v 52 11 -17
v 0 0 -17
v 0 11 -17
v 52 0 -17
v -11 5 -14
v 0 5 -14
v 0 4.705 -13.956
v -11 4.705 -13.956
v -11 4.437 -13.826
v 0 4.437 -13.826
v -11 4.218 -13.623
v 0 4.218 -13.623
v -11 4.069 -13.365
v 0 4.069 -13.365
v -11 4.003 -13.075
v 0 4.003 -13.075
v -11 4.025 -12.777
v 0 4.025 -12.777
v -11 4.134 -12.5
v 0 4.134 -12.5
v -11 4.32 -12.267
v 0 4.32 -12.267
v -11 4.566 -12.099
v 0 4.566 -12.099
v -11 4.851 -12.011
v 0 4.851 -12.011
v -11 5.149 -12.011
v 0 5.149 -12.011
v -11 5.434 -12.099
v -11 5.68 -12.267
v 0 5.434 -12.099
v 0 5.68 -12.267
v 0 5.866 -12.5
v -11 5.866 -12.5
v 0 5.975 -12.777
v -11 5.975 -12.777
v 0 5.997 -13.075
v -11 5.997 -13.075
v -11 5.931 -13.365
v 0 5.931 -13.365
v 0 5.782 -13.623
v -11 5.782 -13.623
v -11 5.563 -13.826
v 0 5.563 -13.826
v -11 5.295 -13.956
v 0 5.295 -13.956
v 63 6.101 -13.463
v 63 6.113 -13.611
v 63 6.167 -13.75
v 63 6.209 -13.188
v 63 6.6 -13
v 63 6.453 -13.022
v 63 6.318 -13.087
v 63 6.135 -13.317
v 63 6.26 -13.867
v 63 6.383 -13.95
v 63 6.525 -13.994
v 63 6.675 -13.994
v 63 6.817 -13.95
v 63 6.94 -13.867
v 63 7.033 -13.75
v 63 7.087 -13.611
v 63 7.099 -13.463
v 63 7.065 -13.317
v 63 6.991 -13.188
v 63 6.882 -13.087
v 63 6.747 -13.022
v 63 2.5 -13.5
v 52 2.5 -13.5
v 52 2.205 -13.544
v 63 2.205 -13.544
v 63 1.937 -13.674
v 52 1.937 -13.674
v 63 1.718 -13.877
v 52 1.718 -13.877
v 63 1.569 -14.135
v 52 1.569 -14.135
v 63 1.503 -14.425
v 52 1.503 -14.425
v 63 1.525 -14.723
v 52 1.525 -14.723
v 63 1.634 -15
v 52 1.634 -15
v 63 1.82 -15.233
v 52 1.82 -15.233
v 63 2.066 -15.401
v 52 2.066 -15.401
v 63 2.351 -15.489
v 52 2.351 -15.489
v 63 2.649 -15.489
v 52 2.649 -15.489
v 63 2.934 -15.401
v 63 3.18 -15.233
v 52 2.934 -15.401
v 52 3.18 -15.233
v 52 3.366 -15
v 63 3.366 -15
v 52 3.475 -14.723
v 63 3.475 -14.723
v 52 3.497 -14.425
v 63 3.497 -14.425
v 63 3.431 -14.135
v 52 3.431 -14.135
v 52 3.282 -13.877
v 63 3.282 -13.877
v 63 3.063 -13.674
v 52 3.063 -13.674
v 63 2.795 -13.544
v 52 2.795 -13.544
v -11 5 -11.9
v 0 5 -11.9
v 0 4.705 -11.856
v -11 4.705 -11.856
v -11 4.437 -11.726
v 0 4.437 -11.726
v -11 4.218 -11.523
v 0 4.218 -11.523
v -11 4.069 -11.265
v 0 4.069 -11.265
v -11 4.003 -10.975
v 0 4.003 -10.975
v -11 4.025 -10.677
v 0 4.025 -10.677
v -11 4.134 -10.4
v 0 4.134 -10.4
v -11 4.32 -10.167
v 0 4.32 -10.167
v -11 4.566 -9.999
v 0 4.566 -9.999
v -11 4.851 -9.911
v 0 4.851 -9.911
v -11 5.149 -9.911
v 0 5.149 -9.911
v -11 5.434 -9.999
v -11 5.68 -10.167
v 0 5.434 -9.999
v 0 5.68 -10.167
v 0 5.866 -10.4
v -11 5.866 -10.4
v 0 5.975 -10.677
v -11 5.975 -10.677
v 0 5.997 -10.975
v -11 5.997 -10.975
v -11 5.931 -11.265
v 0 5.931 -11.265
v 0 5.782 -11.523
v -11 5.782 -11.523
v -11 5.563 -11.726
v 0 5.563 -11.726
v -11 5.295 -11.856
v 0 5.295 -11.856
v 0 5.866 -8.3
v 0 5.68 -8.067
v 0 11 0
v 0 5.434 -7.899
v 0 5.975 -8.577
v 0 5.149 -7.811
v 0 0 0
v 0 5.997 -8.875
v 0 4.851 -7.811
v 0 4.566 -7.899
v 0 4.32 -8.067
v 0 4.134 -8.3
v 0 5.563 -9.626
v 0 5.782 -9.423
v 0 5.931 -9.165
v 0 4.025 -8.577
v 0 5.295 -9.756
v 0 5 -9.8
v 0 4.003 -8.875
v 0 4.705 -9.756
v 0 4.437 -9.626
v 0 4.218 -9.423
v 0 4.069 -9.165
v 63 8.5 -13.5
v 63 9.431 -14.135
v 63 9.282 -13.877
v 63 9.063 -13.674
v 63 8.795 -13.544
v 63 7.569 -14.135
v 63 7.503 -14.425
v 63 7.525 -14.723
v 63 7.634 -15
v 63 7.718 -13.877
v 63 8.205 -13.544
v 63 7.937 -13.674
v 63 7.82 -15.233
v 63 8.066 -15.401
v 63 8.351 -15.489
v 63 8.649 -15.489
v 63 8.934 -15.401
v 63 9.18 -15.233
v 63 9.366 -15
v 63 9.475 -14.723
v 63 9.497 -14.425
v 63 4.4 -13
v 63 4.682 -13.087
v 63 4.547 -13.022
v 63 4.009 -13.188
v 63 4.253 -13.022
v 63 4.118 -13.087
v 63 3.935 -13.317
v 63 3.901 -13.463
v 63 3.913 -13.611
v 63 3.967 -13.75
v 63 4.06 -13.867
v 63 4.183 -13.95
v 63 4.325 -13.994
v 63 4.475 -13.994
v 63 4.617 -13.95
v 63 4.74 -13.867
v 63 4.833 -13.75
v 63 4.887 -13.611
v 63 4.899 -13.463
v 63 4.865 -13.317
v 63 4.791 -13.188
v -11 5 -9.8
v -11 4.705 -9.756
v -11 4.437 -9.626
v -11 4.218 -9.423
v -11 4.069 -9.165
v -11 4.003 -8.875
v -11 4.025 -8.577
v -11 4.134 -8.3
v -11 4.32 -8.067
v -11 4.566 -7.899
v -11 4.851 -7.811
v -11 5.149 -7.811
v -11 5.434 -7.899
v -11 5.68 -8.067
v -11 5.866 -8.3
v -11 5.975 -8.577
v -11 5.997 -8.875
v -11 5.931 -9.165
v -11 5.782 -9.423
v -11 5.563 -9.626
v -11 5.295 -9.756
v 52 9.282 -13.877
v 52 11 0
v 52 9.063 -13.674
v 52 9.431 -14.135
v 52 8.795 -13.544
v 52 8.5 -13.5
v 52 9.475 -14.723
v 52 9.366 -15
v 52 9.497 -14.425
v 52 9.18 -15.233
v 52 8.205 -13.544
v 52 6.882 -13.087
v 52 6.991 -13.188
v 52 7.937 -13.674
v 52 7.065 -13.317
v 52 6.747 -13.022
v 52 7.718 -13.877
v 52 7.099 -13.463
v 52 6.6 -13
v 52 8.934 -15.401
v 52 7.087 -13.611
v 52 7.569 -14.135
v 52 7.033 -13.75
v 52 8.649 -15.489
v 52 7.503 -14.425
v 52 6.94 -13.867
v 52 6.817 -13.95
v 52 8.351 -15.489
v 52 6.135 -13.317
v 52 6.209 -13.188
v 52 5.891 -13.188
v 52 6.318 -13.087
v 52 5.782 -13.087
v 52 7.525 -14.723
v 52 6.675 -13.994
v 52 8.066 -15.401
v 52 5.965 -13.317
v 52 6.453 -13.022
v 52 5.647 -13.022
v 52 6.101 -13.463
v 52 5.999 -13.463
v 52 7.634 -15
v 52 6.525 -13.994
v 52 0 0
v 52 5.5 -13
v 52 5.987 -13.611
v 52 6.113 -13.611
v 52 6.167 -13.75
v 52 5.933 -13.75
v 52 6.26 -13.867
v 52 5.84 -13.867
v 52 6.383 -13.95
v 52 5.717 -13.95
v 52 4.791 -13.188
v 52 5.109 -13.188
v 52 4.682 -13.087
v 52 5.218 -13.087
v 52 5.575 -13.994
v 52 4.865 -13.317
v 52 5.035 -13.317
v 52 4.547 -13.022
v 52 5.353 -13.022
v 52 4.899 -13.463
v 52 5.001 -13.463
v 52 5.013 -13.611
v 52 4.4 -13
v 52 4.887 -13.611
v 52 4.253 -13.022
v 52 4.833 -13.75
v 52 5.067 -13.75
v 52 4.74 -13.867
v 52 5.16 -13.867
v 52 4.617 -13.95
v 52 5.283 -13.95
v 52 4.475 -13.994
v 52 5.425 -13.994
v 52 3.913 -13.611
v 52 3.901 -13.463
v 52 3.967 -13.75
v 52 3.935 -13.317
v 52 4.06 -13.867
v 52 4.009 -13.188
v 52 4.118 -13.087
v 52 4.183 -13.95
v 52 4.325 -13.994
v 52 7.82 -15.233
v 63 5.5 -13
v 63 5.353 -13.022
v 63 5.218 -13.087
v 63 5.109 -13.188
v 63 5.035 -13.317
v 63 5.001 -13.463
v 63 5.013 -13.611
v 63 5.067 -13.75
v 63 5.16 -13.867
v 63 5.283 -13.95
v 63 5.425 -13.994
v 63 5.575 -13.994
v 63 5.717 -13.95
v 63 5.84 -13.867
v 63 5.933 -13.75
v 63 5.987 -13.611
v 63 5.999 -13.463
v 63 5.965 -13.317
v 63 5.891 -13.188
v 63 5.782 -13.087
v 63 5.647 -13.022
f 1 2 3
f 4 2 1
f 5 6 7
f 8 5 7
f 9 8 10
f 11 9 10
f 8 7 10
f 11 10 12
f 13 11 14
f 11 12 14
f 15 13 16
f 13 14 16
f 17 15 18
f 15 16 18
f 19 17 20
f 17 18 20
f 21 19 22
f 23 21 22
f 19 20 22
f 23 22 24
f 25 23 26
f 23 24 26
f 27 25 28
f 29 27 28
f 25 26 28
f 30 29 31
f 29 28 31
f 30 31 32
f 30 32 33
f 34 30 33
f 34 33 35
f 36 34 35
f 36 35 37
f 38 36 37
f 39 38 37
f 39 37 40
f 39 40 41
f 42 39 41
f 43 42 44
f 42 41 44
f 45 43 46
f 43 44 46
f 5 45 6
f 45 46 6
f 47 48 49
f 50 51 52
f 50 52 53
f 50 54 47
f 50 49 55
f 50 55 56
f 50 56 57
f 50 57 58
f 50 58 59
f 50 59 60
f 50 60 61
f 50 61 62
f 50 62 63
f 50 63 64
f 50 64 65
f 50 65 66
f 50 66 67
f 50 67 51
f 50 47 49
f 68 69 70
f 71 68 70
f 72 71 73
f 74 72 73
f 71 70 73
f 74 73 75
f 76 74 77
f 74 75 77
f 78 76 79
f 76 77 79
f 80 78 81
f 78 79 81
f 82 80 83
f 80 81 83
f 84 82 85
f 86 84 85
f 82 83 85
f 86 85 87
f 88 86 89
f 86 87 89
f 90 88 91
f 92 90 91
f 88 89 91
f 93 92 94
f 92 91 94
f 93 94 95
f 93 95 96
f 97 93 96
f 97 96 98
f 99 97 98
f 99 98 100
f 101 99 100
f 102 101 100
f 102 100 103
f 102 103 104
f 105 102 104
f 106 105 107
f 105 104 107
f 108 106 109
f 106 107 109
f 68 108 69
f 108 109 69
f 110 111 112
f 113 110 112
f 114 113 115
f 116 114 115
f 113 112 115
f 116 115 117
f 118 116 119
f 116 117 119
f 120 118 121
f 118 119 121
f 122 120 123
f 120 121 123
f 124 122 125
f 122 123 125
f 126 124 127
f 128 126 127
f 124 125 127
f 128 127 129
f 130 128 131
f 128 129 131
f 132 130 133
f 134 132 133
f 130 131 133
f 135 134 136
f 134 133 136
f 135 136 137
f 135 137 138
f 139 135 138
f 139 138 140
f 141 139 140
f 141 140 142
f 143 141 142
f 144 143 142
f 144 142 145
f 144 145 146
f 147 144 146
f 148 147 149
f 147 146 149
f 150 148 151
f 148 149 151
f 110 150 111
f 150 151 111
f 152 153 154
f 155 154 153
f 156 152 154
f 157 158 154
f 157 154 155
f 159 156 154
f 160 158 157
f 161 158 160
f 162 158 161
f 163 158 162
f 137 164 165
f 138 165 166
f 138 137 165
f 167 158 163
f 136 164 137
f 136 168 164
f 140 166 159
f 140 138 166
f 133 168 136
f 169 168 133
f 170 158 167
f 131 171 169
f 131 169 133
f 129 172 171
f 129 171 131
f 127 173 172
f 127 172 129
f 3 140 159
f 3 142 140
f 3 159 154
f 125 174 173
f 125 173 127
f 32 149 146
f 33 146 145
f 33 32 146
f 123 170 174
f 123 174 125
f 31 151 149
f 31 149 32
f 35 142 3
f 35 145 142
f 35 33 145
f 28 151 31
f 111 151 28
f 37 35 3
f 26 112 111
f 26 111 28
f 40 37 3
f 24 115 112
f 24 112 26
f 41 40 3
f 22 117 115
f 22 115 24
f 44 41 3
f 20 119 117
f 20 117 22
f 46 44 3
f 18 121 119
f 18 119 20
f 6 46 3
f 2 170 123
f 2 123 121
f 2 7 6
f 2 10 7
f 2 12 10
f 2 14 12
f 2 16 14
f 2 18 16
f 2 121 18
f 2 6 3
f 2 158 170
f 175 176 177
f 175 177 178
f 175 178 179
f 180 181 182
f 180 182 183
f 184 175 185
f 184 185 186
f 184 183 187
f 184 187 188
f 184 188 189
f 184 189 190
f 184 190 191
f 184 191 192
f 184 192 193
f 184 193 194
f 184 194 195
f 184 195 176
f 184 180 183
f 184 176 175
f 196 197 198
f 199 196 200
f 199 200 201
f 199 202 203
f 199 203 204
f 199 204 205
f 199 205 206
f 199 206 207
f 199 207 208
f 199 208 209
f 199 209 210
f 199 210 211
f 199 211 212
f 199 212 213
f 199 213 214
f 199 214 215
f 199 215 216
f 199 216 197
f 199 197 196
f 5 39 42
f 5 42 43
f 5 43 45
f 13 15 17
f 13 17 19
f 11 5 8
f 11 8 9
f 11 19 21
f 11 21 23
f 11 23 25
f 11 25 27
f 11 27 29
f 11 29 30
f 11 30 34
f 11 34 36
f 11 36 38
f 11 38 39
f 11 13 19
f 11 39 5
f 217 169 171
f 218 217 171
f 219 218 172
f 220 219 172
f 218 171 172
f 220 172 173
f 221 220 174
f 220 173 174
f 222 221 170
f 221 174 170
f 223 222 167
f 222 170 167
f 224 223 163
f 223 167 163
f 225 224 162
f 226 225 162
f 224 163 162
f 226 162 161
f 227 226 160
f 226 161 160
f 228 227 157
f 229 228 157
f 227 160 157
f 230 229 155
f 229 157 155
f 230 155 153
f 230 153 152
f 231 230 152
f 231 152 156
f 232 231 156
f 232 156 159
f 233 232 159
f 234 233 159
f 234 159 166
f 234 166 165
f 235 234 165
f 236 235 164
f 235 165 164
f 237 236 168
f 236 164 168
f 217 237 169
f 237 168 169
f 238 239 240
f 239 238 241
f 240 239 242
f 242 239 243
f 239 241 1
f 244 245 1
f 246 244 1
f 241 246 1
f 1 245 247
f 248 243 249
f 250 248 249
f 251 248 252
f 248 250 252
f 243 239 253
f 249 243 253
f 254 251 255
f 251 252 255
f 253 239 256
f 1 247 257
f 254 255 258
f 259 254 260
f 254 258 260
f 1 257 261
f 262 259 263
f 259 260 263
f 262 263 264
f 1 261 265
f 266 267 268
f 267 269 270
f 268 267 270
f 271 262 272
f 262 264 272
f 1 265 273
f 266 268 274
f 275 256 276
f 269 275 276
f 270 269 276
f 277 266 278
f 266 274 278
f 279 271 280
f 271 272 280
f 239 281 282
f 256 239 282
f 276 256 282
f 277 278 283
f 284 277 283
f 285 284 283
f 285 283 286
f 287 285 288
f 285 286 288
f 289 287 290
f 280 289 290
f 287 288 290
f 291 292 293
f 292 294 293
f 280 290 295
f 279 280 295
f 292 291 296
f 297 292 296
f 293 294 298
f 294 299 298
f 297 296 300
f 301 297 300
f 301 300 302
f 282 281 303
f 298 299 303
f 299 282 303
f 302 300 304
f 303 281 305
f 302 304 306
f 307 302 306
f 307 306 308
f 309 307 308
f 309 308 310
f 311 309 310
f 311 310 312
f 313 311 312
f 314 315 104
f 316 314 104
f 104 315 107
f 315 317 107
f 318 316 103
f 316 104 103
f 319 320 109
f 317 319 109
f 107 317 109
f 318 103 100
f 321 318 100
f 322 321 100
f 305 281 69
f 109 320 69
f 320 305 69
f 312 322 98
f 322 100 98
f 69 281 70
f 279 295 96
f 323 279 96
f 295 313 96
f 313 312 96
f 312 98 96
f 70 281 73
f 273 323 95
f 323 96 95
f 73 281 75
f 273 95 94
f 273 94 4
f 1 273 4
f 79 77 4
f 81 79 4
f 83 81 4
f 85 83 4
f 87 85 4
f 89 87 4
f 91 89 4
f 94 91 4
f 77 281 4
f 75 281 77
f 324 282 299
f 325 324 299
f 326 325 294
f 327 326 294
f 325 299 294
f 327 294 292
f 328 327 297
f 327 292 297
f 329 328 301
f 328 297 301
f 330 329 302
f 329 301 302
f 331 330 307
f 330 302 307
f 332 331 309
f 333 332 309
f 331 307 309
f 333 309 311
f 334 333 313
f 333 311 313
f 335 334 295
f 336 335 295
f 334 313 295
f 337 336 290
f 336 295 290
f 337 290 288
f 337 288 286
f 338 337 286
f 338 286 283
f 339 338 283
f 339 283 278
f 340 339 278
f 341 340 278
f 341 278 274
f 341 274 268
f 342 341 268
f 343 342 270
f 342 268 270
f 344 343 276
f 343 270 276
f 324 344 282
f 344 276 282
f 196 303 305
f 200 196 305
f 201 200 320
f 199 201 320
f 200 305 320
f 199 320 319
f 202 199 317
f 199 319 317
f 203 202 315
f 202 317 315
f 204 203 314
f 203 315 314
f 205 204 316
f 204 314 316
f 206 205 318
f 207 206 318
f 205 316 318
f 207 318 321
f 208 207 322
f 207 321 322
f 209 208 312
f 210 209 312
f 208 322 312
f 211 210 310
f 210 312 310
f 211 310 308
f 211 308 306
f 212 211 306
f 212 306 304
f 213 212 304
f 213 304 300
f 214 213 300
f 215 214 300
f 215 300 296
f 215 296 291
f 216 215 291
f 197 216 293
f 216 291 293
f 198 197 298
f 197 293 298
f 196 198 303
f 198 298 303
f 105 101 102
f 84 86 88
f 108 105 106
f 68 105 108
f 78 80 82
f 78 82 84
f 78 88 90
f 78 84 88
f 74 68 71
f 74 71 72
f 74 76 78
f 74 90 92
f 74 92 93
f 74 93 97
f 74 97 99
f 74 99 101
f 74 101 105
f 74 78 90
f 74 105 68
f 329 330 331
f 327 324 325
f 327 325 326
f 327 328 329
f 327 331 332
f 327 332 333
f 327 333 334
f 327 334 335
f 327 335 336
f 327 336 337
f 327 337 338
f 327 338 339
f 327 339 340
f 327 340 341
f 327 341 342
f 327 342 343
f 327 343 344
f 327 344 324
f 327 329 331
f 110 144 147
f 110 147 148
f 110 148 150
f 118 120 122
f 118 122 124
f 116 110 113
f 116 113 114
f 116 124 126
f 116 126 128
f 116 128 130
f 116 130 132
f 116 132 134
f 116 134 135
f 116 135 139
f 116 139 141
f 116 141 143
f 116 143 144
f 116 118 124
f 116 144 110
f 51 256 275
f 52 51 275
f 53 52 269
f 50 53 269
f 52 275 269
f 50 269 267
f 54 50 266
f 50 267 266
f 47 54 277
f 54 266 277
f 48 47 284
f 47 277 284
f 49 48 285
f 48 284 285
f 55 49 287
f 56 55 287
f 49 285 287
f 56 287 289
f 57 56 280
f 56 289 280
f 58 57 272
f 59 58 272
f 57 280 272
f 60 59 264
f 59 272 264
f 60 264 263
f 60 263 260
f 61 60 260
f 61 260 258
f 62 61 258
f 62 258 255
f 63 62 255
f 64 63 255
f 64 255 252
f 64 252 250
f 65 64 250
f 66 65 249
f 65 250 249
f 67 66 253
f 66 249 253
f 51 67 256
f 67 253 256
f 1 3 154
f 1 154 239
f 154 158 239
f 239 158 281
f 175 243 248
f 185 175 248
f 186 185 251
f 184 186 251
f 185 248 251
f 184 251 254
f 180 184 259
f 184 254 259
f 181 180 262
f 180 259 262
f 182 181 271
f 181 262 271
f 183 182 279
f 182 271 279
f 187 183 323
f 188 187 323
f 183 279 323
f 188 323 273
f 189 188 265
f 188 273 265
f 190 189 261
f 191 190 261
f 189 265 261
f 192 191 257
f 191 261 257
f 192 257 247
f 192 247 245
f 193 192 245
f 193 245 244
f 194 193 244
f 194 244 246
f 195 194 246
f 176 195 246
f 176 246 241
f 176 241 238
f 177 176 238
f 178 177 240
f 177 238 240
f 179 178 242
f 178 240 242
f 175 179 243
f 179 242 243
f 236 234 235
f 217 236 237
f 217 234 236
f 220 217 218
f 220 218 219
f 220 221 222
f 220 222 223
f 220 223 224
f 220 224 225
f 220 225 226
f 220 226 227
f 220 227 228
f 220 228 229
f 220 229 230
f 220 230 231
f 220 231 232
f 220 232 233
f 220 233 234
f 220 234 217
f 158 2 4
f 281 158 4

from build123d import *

# Parameters (mm, degrees)
SKETCH1_W           = 52
SKETCH1_H           = 17
BOSS_EXTRUDE1_DEPTH = 11
SKETCH2_R           = 1
BOSS_EXTRUDE2_DEPTH = 11
SKETCH3_R           = 1
SKETCH3_R_2         = 0.5
BOSS_EXTRUDE3_DEPTH = 11


with BuildPart() as part:
    # Sketch1 → Boss-Extrude1 (new body)
    with BuildSketch(Plane(origin=(0, 0, 0), x_dir=(1, 0, 0), z_dir=(0, 1, 0))):
        with Locations((26, 8.5)):
            Rectangle(SKETCH1_W, SKETCH1_H)
    extrude(amount=BOSS_EXTRUDE1_DEPTH)

    # Sketch2 → Boss-Extrude2 (add)
    with BuildSketch(Plane.ZY):
        with Locations(Location((-13, 5, 0), (0, 0, 180))):
            Circle(SKETCH2_R)
        with Locations(Location((-10.9, 5, 0), (0, 0, 180))):
            Circle(SKETCH2_R)
        with Locations(Location((-8.8, 5, 0), (0, 0, 180))):
            Circle(SKETCH2_R)
    extrude(amount=BOSS_EXTRUDE2_DEPTH)

    # Sketch3 → Boss-Extrude3 (add)
    with BuildSketch(Plane(origin=(52, 0, 0), x_dir=(0, 0, -1), z_dir=(1, 0, 0))):
        with Locations(Location((14.5, 8.5, 0), (0, 0, 180))):
            Circle(SKETCH3_R)
        with Locations(Location((14.5, 2.5, 0), (0, 0, 180))):
            Circle(SKETCH3_R)
        with Locations(Location((13.5, 6.6, 0), (0, 0, 180))):
            Circle(SKETCH3_R_2)
        with Locations(Location((13.5, 5.5, 0), (0, 0, 180))):
            Circle(SKETCH3_R_2)
        with Locations(Location((13.5, 4.4, 0), (0, 0, 180))):
            Circle(SKETCH3_R_2)
    extrude(amount=BOSS_EXTRUDE3_DEPTH)


solid = part.part
